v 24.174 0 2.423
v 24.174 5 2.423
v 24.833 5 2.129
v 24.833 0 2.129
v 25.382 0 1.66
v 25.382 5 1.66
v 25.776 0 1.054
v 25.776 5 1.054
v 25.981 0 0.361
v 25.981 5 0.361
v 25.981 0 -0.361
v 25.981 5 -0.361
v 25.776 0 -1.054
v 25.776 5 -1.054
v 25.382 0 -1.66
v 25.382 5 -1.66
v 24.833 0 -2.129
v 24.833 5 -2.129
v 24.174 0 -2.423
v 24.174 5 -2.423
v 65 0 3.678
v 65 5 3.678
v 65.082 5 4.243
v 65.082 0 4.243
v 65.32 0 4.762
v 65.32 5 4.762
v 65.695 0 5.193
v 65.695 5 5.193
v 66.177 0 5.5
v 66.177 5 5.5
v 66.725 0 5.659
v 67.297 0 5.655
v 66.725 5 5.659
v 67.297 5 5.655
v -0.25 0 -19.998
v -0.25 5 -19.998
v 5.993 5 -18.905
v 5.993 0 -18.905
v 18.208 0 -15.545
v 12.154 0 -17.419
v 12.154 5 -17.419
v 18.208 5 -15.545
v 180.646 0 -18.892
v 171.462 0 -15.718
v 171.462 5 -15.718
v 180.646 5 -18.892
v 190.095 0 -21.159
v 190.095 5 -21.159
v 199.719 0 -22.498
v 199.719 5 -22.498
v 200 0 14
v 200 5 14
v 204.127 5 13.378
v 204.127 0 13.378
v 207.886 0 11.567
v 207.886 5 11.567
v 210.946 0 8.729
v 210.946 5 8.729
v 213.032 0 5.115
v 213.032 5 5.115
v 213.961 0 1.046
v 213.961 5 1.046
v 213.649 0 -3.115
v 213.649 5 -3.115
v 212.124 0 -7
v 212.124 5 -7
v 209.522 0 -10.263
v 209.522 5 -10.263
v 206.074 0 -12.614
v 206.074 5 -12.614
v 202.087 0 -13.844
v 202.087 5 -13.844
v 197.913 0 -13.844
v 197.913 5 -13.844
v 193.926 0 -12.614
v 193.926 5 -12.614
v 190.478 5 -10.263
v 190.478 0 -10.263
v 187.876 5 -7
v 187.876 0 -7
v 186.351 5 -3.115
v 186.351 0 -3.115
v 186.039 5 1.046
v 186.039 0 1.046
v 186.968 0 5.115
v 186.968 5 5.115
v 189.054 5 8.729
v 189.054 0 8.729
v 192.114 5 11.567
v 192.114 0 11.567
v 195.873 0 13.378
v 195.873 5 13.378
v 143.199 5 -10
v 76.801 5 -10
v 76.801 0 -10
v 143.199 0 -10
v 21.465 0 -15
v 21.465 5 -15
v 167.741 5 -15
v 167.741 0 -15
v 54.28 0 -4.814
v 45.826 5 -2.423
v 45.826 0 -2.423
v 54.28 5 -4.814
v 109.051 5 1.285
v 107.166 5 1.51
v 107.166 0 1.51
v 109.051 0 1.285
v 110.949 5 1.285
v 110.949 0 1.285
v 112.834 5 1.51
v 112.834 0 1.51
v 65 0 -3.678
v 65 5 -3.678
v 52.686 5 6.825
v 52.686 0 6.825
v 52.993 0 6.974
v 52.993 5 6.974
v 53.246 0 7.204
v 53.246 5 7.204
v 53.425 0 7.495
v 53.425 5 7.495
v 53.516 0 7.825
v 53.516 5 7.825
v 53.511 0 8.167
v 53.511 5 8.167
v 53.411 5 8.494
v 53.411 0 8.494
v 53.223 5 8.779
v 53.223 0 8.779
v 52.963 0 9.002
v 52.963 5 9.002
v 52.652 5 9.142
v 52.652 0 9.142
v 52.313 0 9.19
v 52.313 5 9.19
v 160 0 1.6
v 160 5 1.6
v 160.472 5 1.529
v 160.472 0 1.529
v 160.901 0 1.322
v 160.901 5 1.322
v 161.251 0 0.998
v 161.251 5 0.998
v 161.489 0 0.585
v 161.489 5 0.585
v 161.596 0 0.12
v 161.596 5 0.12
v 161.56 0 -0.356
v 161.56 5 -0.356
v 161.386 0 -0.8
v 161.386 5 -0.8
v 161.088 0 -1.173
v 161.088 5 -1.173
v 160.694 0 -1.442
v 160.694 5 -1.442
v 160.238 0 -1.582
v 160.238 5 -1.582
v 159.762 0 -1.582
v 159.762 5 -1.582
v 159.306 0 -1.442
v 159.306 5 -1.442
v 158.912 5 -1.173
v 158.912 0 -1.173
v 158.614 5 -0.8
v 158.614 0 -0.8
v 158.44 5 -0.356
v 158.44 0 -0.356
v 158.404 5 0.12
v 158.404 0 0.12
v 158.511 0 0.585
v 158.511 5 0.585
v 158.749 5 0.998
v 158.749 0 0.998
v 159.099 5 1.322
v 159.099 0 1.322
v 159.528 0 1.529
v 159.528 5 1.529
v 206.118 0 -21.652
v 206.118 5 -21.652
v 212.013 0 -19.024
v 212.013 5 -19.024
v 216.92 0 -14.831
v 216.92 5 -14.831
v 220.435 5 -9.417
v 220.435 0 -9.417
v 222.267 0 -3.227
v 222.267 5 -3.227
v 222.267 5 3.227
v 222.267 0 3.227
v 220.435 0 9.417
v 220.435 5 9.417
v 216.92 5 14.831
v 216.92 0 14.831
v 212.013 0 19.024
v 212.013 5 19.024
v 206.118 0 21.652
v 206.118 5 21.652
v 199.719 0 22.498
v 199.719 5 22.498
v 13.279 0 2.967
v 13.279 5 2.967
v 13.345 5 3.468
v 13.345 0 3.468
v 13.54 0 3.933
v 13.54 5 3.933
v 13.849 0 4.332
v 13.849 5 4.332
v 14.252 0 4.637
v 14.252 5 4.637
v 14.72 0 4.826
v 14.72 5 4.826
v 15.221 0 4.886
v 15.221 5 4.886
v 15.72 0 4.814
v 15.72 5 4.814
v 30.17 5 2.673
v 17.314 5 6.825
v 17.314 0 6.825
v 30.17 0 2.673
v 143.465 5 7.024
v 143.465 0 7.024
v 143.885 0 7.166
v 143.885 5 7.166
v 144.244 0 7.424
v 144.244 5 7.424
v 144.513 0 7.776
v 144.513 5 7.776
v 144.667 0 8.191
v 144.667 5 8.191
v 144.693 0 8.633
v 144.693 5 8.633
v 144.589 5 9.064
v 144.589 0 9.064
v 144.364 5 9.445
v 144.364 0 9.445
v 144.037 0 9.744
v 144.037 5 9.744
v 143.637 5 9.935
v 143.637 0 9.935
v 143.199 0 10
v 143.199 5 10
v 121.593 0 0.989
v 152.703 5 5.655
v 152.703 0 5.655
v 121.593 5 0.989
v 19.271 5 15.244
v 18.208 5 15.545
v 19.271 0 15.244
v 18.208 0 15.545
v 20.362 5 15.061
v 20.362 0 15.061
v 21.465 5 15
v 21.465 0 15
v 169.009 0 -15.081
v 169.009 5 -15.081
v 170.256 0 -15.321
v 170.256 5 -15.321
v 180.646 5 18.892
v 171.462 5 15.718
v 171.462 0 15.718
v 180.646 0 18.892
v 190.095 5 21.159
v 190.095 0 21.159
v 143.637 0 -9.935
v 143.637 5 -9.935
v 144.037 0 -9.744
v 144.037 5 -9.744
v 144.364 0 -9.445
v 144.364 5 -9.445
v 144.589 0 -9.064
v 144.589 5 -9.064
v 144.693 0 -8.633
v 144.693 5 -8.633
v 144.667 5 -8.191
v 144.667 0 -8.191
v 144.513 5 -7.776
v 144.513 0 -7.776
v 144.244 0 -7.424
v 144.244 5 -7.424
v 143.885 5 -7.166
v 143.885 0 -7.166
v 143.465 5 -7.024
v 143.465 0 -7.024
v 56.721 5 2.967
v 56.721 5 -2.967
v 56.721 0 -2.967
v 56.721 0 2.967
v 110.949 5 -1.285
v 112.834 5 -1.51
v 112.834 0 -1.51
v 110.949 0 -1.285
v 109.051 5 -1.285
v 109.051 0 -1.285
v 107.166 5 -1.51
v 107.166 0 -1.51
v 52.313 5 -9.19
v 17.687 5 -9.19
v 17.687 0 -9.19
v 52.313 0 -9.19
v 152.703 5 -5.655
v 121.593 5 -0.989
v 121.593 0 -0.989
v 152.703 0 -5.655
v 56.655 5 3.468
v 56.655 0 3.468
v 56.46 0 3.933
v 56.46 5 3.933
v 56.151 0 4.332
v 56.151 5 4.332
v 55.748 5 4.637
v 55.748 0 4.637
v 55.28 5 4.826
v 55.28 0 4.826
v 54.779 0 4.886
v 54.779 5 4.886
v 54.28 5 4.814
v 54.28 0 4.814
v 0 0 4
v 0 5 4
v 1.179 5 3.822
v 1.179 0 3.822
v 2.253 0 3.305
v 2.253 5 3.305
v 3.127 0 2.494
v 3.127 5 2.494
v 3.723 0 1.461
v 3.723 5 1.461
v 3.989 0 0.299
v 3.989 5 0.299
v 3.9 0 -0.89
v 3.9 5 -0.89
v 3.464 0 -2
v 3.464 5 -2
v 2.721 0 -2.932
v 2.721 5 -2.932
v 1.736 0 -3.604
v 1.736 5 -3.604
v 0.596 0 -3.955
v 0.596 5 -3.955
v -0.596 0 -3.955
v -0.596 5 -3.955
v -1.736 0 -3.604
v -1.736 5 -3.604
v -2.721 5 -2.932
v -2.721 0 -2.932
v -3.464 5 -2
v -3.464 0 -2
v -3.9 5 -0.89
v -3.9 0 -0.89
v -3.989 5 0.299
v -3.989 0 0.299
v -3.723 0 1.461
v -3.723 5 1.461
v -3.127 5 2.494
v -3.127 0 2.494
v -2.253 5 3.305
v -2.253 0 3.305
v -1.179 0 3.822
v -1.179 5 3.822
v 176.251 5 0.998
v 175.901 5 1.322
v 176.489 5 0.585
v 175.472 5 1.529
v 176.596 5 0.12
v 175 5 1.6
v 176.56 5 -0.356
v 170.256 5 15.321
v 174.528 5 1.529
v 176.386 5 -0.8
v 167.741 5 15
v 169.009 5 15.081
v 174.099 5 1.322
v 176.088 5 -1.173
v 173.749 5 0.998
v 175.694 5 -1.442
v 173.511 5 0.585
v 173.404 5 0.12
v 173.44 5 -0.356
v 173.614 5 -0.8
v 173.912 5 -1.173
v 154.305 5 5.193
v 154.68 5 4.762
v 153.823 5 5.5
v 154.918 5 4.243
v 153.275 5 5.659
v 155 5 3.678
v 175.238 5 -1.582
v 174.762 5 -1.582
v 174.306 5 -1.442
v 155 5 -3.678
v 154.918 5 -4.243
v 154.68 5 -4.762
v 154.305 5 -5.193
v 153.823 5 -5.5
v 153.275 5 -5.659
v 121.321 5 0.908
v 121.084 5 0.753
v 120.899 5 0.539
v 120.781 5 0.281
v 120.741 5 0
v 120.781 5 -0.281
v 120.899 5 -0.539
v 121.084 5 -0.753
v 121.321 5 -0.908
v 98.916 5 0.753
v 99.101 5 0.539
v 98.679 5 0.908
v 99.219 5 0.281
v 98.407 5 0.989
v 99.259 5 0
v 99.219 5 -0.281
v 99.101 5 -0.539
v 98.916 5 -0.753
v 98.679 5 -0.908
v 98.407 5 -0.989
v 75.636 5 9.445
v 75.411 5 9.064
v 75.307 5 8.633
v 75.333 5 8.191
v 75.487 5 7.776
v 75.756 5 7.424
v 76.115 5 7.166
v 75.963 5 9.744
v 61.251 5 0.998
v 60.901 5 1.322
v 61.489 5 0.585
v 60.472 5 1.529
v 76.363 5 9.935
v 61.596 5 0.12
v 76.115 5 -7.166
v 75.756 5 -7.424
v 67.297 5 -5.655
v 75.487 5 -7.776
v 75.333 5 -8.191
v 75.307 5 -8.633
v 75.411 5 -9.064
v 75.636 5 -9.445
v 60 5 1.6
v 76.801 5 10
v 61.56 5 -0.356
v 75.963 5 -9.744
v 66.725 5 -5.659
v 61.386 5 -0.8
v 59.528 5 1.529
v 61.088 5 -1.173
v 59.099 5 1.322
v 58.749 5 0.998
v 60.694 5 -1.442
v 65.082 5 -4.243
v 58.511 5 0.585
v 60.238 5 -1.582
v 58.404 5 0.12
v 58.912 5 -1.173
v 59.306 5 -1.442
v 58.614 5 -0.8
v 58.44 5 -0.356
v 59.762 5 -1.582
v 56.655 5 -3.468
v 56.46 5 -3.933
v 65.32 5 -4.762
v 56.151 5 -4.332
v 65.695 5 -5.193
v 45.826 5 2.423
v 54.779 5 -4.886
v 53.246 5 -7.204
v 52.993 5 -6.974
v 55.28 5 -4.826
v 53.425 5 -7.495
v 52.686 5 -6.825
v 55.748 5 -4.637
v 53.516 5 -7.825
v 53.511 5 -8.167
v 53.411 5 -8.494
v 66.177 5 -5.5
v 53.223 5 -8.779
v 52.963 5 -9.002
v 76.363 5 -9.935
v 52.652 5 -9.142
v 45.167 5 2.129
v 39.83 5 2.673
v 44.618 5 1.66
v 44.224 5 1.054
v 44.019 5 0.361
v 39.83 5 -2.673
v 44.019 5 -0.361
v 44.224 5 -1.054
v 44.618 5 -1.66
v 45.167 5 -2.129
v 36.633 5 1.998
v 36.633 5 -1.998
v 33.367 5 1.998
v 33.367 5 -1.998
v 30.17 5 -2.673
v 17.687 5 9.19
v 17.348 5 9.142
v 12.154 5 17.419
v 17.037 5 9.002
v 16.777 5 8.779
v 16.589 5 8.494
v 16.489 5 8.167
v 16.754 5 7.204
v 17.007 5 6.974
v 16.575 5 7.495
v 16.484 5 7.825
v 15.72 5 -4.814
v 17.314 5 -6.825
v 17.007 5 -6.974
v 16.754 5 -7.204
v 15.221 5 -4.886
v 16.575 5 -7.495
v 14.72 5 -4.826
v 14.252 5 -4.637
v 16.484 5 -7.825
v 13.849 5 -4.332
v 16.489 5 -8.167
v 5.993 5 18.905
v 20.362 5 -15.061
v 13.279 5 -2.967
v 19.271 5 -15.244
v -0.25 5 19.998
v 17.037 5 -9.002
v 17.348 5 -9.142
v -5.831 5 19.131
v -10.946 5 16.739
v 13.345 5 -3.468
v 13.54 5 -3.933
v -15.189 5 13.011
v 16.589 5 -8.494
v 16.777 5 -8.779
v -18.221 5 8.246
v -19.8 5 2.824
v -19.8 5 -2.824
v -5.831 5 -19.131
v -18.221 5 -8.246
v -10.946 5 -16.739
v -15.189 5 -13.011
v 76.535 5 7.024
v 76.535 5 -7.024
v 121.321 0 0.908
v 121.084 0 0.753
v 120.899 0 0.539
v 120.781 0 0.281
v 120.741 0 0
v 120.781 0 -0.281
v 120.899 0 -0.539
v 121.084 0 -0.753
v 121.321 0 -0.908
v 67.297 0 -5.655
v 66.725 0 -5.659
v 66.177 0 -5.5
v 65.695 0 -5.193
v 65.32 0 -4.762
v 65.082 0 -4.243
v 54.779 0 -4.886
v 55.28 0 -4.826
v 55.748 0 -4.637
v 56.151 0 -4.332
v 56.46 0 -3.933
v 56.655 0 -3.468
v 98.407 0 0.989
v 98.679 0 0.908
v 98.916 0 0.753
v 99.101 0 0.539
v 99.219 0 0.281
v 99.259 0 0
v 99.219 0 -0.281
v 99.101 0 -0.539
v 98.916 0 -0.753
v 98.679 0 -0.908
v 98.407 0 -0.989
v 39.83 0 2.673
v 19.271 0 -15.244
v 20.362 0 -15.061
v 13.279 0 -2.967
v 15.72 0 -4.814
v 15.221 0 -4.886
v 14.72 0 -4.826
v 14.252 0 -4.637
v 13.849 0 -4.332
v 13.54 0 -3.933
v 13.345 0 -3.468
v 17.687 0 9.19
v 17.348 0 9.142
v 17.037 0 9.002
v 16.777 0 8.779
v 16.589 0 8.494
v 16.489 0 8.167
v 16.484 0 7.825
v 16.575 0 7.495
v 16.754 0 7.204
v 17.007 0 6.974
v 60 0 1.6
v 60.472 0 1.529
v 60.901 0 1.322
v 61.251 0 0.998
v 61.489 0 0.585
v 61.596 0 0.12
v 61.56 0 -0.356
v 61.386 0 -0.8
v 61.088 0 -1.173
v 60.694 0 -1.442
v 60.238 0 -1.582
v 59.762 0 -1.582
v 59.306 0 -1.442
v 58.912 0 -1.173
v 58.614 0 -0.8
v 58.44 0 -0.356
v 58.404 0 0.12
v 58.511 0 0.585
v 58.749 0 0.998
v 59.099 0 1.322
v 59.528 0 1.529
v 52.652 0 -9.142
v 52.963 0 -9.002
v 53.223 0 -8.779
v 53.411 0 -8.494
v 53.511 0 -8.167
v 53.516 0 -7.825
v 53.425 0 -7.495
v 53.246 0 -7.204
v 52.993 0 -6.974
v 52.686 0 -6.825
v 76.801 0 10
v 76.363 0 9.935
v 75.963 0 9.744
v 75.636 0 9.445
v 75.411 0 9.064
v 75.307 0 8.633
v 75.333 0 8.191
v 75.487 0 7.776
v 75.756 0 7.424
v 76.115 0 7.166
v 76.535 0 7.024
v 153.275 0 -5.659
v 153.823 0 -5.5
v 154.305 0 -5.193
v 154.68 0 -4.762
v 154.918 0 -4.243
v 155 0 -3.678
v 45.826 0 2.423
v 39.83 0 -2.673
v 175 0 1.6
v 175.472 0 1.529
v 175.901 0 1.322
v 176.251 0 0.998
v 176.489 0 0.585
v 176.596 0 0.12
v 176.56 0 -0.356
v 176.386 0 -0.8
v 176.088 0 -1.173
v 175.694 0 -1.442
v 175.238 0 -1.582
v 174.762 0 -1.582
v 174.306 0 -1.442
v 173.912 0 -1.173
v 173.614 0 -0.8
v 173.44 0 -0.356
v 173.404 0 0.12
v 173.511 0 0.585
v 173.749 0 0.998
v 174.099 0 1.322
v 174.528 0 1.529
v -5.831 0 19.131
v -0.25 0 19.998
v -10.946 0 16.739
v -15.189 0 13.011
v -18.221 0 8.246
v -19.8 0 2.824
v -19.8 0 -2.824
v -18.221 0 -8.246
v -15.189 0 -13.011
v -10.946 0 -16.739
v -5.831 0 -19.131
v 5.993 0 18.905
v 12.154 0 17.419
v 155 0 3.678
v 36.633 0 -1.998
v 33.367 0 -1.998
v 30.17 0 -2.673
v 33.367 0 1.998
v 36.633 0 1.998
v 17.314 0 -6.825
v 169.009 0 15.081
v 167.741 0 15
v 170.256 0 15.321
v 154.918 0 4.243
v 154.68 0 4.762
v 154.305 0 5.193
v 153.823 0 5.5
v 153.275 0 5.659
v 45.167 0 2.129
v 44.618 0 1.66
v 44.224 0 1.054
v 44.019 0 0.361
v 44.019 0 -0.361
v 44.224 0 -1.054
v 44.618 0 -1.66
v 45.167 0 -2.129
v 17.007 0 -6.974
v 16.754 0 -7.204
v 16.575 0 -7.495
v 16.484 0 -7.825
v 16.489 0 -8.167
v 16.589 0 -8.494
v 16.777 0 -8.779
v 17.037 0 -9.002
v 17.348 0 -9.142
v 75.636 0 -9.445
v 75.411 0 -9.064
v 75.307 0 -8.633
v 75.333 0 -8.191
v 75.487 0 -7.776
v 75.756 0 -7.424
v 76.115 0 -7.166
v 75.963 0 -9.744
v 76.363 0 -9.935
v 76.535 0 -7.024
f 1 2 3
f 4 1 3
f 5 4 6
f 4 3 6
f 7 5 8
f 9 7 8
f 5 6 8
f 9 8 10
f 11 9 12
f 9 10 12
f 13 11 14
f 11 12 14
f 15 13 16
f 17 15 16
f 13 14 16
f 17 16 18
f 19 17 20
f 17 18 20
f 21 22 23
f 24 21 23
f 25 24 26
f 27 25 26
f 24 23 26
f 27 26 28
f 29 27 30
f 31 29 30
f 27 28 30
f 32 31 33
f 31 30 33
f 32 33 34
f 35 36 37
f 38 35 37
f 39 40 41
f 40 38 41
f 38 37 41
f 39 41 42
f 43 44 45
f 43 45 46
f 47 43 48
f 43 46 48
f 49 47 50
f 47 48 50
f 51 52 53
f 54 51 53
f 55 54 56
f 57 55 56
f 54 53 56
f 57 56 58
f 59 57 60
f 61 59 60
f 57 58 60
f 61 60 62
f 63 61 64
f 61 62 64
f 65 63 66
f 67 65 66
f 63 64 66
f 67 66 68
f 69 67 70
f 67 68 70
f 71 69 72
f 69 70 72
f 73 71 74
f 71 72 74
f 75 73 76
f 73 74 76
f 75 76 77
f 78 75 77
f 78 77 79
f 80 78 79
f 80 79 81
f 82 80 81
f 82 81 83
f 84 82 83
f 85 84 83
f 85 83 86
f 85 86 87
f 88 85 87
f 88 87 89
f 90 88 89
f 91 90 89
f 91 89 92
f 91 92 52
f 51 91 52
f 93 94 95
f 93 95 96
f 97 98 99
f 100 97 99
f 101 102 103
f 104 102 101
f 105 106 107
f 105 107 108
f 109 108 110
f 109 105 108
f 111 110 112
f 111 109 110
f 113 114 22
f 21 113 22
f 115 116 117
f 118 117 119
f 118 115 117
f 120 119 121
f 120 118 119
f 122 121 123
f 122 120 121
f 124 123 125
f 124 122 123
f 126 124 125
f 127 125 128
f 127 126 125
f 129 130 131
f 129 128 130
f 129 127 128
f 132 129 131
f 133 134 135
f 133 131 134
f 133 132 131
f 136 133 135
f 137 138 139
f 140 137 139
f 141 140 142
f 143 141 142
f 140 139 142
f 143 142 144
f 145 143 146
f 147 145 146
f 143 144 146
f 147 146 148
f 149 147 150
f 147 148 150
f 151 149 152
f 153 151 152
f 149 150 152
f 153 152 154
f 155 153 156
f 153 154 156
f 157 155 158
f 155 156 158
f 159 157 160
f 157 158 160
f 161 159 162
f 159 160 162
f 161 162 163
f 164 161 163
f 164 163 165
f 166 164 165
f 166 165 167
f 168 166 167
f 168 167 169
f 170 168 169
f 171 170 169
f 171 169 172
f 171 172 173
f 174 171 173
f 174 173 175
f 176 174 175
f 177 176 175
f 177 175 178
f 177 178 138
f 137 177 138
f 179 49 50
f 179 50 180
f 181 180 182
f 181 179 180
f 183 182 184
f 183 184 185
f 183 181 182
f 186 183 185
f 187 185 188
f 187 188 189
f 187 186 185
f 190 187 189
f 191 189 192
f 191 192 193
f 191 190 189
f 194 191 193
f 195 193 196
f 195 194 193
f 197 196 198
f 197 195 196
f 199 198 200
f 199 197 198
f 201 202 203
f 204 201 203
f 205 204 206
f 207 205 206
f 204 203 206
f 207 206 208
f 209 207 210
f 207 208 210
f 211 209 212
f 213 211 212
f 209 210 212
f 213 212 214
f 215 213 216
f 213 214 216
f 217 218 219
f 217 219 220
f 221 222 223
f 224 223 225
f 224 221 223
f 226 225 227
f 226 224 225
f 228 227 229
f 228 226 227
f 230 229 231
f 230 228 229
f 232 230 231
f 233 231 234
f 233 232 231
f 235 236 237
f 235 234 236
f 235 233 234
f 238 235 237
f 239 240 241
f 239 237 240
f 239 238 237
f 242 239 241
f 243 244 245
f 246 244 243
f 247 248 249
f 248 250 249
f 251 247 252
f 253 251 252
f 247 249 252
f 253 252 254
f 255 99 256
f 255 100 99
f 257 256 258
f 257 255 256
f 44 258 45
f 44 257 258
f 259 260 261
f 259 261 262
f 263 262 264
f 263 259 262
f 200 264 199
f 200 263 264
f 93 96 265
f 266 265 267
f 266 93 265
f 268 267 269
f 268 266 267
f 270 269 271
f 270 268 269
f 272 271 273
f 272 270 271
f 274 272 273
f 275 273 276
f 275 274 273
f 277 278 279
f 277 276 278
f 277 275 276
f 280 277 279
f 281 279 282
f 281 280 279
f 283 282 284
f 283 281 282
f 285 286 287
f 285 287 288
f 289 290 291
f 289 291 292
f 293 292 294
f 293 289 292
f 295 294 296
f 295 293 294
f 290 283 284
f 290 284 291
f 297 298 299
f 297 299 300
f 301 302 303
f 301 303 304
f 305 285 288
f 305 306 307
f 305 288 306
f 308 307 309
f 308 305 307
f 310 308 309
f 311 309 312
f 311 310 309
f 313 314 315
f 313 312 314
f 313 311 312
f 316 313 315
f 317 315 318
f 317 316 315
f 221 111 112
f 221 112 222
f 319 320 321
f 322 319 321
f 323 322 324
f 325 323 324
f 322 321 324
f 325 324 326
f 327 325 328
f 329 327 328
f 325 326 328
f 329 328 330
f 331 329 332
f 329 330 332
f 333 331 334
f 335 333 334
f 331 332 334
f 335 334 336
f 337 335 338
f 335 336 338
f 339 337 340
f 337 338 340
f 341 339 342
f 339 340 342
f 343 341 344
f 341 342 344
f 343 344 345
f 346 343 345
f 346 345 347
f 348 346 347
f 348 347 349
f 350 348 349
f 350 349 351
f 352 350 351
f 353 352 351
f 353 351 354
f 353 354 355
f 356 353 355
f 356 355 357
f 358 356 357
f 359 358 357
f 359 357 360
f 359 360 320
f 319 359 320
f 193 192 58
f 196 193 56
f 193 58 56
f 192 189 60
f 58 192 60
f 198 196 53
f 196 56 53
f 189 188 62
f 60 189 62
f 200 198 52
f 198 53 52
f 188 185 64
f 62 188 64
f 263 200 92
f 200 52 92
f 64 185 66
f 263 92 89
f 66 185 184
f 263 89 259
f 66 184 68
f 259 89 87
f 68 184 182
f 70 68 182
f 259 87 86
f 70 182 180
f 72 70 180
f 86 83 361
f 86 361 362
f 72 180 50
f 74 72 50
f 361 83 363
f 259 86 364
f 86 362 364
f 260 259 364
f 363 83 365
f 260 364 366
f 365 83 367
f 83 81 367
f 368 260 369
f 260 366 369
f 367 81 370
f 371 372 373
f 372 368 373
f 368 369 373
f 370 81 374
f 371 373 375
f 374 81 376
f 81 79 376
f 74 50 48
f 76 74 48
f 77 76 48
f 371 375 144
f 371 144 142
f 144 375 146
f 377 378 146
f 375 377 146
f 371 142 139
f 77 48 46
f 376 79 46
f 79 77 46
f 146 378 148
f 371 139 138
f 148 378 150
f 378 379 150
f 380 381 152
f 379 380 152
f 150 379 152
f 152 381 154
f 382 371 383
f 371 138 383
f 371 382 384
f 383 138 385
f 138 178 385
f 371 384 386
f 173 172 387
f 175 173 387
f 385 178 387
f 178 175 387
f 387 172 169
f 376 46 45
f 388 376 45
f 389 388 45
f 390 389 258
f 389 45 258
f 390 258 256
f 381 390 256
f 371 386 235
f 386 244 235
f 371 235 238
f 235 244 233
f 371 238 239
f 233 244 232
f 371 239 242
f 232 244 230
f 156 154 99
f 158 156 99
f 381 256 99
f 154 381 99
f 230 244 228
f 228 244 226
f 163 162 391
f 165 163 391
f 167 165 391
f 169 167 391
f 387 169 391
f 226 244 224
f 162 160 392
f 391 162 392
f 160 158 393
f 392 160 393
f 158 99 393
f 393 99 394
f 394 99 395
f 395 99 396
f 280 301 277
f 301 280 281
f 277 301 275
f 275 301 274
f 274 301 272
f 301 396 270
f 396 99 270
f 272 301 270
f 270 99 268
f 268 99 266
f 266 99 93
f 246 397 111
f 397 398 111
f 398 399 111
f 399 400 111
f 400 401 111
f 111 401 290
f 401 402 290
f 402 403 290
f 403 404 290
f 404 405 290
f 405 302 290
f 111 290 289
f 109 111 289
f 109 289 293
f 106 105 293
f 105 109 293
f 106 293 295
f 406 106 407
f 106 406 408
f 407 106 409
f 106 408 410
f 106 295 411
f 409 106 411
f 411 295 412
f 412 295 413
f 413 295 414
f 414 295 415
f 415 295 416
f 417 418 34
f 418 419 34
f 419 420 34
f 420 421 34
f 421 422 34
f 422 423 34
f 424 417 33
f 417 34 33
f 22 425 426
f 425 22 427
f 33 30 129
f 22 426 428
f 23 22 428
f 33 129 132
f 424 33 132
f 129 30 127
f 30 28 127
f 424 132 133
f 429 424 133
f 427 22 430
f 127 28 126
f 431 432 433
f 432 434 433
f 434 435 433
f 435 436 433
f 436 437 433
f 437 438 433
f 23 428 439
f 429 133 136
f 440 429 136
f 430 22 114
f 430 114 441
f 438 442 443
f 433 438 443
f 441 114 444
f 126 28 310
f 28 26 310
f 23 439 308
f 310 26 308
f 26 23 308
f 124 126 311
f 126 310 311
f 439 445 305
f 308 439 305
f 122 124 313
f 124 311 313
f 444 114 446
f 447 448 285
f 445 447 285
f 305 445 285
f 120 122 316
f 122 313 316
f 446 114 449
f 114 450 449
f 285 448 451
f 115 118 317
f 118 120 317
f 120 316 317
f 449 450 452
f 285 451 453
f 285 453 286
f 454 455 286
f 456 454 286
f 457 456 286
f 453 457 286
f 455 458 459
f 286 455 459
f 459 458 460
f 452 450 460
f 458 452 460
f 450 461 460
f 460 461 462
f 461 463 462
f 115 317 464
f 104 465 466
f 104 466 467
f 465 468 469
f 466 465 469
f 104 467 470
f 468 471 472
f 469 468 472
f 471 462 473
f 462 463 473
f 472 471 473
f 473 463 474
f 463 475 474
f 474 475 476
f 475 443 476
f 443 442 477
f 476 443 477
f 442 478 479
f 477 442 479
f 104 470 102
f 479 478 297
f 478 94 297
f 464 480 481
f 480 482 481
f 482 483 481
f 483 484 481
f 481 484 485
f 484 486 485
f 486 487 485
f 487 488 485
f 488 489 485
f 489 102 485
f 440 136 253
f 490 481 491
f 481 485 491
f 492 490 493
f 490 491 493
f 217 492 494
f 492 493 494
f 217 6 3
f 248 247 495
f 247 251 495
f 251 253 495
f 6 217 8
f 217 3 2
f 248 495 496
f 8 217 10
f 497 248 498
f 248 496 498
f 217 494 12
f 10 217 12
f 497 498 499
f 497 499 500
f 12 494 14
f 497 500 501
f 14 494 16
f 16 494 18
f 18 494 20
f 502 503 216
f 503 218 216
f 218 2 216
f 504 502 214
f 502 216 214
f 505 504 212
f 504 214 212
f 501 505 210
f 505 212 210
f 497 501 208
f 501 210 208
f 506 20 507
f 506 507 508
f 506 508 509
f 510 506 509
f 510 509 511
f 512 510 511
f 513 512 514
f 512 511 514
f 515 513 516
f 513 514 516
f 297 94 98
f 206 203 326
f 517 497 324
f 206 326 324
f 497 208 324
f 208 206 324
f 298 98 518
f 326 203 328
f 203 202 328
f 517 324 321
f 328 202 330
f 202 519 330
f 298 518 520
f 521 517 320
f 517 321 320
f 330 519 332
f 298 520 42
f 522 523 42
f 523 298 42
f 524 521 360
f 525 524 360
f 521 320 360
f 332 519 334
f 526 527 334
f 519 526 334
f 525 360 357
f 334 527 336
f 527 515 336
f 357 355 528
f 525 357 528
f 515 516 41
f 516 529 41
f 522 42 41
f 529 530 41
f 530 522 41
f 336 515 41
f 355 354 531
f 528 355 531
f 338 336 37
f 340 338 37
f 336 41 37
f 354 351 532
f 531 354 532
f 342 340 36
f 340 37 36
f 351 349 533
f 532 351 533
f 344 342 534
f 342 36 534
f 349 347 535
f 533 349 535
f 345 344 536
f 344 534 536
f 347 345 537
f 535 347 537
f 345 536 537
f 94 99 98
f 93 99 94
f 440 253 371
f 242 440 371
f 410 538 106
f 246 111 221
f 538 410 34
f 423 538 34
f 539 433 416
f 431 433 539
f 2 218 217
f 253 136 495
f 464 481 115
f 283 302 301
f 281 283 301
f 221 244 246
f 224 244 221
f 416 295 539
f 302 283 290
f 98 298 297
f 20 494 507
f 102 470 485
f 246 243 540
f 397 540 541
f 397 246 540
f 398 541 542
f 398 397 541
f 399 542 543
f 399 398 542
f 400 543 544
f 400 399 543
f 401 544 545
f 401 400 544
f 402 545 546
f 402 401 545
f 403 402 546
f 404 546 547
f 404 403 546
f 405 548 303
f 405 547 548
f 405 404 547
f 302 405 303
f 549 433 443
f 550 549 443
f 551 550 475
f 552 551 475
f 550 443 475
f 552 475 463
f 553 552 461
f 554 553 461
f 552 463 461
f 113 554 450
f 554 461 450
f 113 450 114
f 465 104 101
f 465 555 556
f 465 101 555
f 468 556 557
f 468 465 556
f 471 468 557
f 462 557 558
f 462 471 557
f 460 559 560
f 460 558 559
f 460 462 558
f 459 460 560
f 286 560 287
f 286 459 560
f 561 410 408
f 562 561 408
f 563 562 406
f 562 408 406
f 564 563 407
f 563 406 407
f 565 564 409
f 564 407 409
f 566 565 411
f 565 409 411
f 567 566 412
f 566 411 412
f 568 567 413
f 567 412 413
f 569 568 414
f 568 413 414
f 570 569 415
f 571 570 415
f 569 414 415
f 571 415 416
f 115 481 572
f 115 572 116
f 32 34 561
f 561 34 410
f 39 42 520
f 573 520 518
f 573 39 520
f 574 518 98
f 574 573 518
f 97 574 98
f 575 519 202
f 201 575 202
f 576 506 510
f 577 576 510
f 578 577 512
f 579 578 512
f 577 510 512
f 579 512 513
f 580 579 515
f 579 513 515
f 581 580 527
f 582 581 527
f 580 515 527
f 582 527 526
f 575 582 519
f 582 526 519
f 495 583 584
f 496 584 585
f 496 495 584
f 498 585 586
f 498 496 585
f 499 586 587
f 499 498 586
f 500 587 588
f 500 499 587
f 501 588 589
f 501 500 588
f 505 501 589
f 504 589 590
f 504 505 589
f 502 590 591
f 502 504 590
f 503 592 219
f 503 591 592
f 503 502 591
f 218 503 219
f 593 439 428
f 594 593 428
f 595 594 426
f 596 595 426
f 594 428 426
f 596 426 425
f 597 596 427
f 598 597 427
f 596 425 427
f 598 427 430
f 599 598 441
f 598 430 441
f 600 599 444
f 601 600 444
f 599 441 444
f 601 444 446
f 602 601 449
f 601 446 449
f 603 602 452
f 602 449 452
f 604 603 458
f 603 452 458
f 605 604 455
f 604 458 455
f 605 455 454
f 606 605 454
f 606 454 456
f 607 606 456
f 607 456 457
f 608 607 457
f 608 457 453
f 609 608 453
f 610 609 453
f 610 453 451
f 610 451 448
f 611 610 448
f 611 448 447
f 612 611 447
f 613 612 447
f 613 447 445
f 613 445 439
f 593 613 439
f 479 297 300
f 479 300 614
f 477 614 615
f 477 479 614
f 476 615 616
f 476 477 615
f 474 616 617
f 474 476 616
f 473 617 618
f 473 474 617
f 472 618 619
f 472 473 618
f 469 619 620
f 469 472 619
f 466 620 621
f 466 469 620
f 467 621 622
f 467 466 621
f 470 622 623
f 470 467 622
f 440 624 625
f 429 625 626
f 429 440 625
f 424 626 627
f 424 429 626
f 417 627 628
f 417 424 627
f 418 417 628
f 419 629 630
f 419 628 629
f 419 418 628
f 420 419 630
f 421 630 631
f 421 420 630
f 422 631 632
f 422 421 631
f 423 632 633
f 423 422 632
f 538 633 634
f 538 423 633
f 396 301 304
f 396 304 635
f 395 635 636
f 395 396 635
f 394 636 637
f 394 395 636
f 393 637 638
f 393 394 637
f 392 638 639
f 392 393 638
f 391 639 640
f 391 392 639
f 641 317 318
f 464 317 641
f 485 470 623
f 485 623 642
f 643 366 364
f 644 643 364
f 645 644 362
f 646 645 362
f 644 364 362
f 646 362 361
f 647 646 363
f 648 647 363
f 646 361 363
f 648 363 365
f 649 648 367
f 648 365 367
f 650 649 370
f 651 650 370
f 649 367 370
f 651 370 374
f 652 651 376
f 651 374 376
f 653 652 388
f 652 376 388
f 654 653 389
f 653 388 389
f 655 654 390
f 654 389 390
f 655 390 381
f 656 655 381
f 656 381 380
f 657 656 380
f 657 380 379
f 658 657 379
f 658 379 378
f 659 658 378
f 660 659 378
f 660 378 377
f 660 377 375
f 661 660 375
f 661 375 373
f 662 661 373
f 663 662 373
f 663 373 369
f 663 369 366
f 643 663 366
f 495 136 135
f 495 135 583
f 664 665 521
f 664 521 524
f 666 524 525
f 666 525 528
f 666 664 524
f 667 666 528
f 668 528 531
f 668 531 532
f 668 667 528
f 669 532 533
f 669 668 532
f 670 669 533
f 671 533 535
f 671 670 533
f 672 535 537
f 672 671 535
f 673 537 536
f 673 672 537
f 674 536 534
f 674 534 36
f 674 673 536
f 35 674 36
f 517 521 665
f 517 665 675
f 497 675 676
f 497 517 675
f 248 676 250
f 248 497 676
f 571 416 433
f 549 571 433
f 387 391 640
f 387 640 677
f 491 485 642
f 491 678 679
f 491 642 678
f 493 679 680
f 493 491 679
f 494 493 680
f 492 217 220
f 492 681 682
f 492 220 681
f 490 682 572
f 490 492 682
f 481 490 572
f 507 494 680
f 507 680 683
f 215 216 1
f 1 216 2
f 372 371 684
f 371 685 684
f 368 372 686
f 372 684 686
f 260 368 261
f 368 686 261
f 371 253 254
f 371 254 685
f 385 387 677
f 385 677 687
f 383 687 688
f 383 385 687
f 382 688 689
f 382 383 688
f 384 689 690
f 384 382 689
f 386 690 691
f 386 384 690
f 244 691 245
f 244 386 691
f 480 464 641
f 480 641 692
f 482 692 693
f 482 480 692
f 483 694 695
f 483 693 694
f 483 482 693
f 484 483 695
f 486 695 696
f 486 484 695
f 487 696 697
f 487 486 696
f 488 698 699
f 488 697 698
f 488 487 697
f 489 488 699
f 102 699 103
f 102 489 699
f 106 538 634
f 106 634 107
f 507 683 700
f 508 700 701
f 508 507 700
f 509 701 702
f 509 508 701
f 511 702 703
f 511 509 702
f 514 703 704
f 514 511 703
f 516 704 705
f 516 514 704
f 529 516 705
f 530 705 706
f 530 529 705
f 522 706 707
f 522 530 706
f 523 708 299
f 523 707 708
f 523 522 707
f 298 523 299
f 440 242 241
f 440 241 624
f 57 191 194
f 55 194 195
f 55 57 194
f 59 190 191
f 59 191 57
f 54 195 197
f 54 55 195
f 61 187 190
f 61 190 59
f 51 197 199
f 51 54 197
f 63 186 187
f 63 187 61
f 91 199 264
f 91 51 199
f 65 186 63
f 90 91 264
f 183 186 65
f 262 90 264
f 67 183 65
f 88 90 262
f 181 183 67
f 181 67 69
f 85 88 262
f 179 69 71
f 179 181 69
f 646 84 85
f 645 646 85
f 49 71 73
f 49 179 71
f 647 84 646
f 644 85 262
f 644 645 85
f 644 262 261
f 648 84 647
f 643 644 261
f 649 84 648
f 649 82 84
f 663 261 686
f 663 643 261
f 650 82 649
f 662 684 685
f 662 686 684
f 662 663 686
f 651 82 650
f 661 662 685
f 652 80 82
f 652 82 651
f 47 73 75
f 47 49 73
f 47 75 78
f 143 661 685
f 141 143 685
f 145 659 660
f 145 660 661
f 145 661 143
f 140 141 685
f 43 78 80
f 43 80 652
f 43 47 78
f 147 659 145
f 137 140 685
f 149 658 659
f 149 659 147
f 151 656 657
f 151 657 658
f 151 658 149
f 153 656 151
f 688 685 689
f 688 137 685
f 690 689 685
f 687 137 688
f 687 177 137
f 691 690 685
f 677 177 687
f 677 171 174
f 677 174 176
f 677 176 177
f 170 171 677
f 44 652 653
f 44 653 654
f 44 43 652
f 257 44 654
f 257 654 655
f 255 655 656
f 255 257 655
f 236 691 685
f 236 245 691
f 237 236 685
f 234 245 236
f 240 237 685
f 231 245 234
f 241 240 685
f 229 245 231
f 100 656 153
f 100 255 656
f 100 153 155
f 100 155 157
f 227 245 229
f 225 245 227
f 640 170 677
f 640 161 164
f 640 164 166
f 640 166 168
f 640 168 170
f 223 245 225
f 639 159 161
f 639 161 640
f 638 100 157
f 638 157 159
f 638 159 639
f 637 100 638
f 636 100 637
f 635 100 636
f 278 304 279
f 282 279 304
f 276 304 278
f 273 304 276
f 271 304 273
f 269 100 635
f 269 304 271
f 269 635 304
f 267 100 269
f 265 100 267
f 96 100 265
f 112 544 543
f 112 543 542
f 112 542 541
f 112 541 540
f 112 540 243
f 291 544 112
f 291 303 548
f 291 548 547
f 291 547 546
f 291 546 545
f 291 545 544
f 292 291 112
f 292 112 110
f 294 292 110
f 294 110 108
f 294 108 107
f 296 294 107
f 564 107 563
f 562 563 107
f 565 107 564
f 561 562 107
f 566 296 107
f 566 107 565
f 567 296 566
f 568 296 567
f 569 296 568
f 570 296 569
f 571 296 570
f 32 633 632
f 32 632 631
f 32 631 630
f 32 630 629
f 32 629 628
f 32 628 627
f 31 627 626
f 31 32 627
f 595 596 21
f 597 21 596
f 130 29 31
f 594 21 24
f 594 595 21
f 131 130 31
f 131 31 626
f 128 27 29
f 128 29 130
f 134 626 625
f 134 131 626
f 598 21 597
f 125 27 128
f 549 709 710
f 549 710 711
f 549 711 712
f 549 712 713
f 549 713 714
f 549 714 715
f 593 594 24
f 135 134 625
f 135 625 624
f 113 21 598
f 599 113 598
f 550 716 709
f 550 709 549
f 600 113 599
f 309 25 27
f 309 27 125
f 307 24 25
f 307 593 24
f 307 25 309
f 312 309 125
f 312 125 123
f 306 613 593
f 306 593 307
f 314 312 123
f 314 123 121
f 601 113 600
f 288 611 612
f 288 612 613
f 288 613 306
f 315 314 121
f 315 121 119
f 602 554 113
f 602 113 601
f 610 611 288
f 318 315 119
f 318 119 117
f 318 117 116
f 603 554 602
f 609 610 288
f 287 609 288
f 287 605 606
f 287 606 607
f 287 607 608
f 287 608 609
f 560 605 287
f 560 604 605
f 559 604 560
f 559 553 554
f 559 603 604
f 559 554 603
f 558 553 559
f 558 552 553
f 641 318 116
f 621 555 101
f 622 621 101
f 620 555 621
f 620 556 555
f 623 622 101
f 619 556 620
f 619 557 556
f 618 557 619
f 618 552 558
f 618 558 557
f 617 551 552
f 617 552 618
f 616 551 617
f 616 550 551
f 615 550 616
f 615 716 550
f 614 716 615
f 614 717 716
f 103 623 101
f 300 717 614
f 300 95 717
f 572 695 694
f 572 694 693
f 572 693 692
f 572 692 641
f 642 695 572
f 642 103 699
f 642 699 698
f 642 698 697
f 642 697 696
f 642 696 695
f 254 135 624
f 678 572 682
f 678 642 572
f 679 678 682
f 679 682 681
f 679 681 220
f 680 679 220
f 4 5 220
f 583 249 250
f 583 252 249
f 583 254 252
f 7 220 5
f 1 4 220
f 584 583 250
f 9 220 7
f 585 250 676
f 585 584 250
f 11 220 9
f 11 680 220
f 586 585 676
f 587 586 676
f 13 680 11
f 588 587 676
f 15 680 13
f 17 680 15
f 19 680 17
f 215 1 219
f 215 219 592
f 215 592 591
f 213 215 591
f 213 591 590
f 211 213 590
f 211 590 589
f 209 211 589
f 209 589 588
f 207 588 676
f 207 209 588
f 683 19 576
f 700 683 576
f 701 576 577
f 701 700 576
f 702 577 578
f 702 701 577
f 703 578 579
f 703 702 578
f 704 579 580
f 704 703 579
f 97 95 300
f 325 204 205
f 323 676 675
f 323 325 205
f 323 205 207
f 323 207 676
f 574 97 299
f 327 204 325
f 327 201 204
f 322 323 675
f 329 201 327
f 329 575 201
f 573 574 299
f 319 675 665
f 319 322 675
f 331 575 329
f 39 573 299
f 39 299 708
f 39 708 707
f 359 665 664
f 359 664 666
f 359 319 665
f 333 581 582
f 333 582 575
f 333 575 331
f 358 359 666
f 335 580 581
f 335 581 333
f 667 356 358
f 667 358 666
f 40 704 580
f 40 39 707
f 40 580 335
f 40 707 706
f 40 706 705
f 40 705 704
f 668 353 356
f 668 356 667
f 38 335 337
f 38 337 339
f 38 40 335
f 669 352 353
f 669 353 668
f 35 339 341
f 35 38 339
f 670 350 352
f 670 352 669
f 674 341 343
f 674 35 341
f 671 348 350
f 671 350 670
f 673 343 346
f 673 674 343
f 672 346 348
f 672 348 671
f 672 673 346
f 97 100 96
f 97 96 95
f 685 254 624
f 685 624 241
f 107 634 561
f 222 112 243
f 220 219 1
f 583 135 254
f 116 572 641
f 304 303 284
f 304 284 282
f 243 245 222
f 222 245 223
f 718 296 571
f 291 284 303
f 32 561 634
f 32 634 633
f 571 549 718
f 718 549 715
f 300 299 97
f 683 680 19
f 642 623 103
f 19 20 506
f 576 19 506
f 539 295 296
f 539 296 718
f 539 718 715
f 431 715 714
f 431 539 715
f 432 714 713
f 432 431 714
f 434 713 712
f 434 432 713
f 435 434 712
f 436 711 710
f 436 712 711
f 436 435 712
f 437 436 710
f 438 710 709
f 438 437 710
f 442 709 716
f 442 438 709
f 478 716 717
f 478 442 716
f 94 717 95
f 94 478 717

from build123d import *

# Parameters (mm, degrees)
EXTRUDE_1_DEPTH     = 5
SKETCH_2_R          = 4
CUT_EXTRUDE_1_DEPTH = 6
SKETCH_3_R          = 14
CUT_EXTRUDE_2_DEPTH = 10
CUT_EXTRUDE_4_DEPTH = 224.690634583
FILLET_1_R          = 10
SKETCH_11_R         = 1.6
CUT_EXTRUDE_5_DEPTH = 224.690634583
CUT_EXTRUDE_6_DEPTH = 10


with BuildPart() as part:
    # 草图1 → 凸台-拉伸1 (new body)
    with BuildSketch(Plane(origin=(0, 0, 0), x_dir=(1, 0, 0), z_dir=(0, 1, 0))):
        with BuildLine():
            Line((-0.25, 19.998437439), (199.71875, 22.498242119))
            ThreePointArc((199.71875, 22.498242119), (222.5, 0), (199.71875, -22.498242119))
            Line((199.71875, -22.498242119), (-0.25, -19.998437439))
            ThreePointArc((-0.25, -19.998437439), (-20, 0), (-0.25, 19.998437439))
        make_face()
    extrude(amount=EXTRUDE_1_DEPTH)

    # 草图2 → 切除-拉伸1 (cut)
    with BuildSketch(Plane(origin=(0, 5, 0), x_dir=(1, 0, 0), z_dir=(0, 1, 0))):
        with Locations(Location((0, 0, 0), (0, 0, 270))):
            Circle(SKETCH_2_R)
    extrude(amount=-CUT_EXTRUDE_1_DEPTH, mode=Mode.SUBTRACT)

    # 草图3 → 切除-拉伸2 (cut)
    with BuildSketch(Plane(origin=(0, 5, 0), x_dir=(1, 0, 0), z_dir=(0, 1, 0))):
        with Locations(Location((200, 0, 0), (0, 0, 270))):
            Circle(SKETCH_3_R)
    extrude(amount=-CUT_EXTRUDE_2_DEPTH, mode=Mode.SUBTRACT)

    # 草图10 → 切除-拉伸4 (cut, through all)
    with BuildSketch(Plane(origin=(0, 5, 0), x_dir=(1, 0, 0), z_dir=(0, 1, 0))):
        with BuildLine():
            Line((19.75, 15), (169.71875, 15))
            ThreePointArc((169.71875, 15), (184.427162899, 19.915742901), (199.71875, 22.498242119))
            Line((199.71875, 22.498242119), (-0.25, 19.998437439))
            ThreePointArc((-0.25, 19.998437439), (9.879148371, 18.015973695), (19.75, 15))
        make_face()
        with BuildLine():
            Line((19.75, -15), (169.71875, -15))
            ThreePointArc((169.71875, -15), (184.427162899, -19.915742901), (199.71875, -22.498242119))
            Line((199.71875, -22.498242119), (-0.25, -19.998437439))
            ThreePointArc((-0.25, -19.998437439), (9.879148371, -18.015973695), (19.75, -15))
        make_face()
    extrude(amount=-CUT_EXTRUDE_4_DEPTH, mode=Mode.SUBTRACT)

    # 圆角1
    fillet_1_edges = [part.edges().sort_by_distance(p)[0] for p in [
        (169.71875, 2.5, 15),
        (19.75, 2.5, 15),
        (19.75, 2.5, -15),
        (169.71875, 2.5, -15),
    ]]
    fillet(fillet_1_edges, radius=FILLET_1_R)

    # 草图11 → 切除-拉伸5 (cut, through all)
    with BuildSketch(Plane(origin=(0, 5, 0), x_dir=(1, 0, 0), z_dir=(0, 1, 0))):
        with Locations(Location((160, 0, 0), (0, 0, 270))):
            Circle(SKETCH_11_R)
        with Locations(Location((60, 0, 0), (0, 0, 270))):
            Circle(SKETCH_11_R)
        with Locations(Location((175, 0, 0), (0, 0, 270))):
            Circle(SKETCH_11_R)
        with BuildLine():
            Line((76.800590531, 10), (143.199409469, 10))
            ThreePointArc((143.199409469, 10), (144.693466443, 8.633393255), (143.465138967, 7.023725014))
            Line((143.465138967, 7.023725014), (112.834447973, 1.510200635))
            ThreePointArc((112.834447973, 1.510200635), (110, 1.257133819), (107.165552027, 1.510200635))
            Line((107.165552027, 1.510200635), (76.534861033, 7.023725014))
            ThreePointArc((76.534861033, 7.023725014), (75.306533557, 8.633393255), (76.800590531, 10))
        make_face()
        with BuildLine():
            Line((65, 3.677625158), (65, -3.677625158))
            ThreePointArc((65, -3.677625158), (65.694887325, -5.193105579), (67.296680906, -5.655497864))
            Line((67.296680906, -5.655497864), (98.407090981, -0.988936353))
            ThreePointArc((98.407090981, -0.988936353), (99.258750528, 0), (98.407090981, 0.988936353))
            Line((98.407090981, 0.988936353), (67.296680906, 5.655497864))
            ThreePointArc((67.296680906, 5.655497864), (65.694887325, 5.193105579), (65, 3.677625158))
        make_face()
        with BuildLine():
            Line((155, 3.677625158), (155, -3.677625158))
            ThreePointArc((155, -3.677625158), (154.305112675, -5.193105579), (152.703319094, -5.655497864))
            Line((152.703319094, -5.655497864), (121.592909019, -0.988936353))
            ThreePointArc((121.592909019, -0.988936353), (120.741249472, 0), (121.592909019, 0.988936353))
            Line((121.592909019, 0.988936353), (152.703319094, 5.655497864))
            ThreePointArc((152.703319094, 5.655497864), (154.305112675, 5.193105579), (155, 3.677625158))
        make_face()
        with BuildLine():
            Line((76.534861033, -7.023725014), (107.165552027, -1.510200635))
            ThreePointArc((107.165552027, -1.510200635), (110, -1.257133819), (112.834447973, -1.510200635))
            Line((112.834447973, -1.510200635), (143.465138967, -7.023725014))
            ThreePointArc((143.465138967, -7.023725014), (144.693466443, -8.633393255), (143.199409469, -10))
            Line((143.199409469, -10), (76.800590531, -10))
            ThreePointArc((76.800590531, -10), (75.306533557, -8.633393255), (76.534861033, -7.023725014))
        make_face()
    extrude(amount=-CUT_EXTRUDE_5_DEPTH, mode=Mode.SUBTRACT)

    # 草图12 → 切除-拉伸6 (cut)
    with BuildSketch(Plane(origin=(0, 5, 0), x_dir=(1, 0, 0), z_dir=(0, 1, 0))):
        with BuildLine():
            Line((17.686639759, 9.190462064), (52.313360241, 9.190462064))
            ThreePointArc((52.313360241, 9.190462064), (53.510878101, 8.166743105), (52.685874964, 6.82457346))
            Line((52.685874964, 6.82457346), (39.829631092, 2.67316319))
            ThreePointArc((39.829631092, 2.67316319), (35, 1.91272642), (30.170368908, 2.67316319))
            Line((30.170368908, 2.67316319), (17.314125036, 6.82457346))
            ThreePointArc((17.314125036, 6.82457346), (16.489121899, 8.166743105), (17.686639759, 9.190462064))
        make_face()
        with BuildLine():
            Line((13.279055715, 2.967439032), (13.279055715, -2.967439032))
            ThreePointArc((13.279055715, -2.967439032), (14.040342171, -4.497828215), (15.720146666, -4.813905705))
            Line((15.720146666, -4.813905705), (24.173861919, -2.423097202))
            ThreePointArc((24.173861919, -2.423097202), (26.006717933, 0), (24.173861919, 2.423097202))
            Line((24.173861919, 2.423097202), (15.720146666, 4.813905705))
            ThreePointArc((15.720146666, 4.813905705), (14.040342171, 4.497828215), (13.279055715, 2.967439032))
        make_face()
        with BuildLine():
            Line((56.720944285, 2.967439032), (56.720944285, -2.967439032))
            ThreePointArc((56.720944285, -2.967439032), (55.959657829, -4.497828215), (54.279853334, -4.813905705))
            Line((54.279853334, -4.813905705), (45.826138081, -2.423097202))
            ThreePointArc((45.826138081, -2.423097202), (43.993282067, 0), (45.826138081, 2.423097202))
            Line((45.826138081, 2.423097202), (54.279853334, 4.813905705))
            ThreePointArc((54.279853334, 4.813905705), (55.959657829, 4.497828215), (56.720944285, 2.967439032))
        make_face()
        with BuildLine():
            Line((17.314125036, -6.82457346), (30.170368908, -2.67316319))
            ThreePointArc((30.170368908, -2.67316319), (35, -1.91272642), (39.829631092, -2.67316319))
            Line((39.829631092, -2.67316319), (52.685874964, -6.82457346))
            ThreePointArc((52.685874964, -6.82457346), (53.510878101, -8.166743105), (52.313360241, -9.190462064))
            Line((52.313360241, -9.190462064), (17.686639759, -9.190462064))
            ThreePointArc((17.686639759, -9.190462064), (16.489121899, -8.166743105), (17.314125036, -6.82457346))
        make_face()
    extrude(amount=-CUT_EXTRUDE_6_DEPTH, mode=Mode.SUBTRACT)


solid = part.part
